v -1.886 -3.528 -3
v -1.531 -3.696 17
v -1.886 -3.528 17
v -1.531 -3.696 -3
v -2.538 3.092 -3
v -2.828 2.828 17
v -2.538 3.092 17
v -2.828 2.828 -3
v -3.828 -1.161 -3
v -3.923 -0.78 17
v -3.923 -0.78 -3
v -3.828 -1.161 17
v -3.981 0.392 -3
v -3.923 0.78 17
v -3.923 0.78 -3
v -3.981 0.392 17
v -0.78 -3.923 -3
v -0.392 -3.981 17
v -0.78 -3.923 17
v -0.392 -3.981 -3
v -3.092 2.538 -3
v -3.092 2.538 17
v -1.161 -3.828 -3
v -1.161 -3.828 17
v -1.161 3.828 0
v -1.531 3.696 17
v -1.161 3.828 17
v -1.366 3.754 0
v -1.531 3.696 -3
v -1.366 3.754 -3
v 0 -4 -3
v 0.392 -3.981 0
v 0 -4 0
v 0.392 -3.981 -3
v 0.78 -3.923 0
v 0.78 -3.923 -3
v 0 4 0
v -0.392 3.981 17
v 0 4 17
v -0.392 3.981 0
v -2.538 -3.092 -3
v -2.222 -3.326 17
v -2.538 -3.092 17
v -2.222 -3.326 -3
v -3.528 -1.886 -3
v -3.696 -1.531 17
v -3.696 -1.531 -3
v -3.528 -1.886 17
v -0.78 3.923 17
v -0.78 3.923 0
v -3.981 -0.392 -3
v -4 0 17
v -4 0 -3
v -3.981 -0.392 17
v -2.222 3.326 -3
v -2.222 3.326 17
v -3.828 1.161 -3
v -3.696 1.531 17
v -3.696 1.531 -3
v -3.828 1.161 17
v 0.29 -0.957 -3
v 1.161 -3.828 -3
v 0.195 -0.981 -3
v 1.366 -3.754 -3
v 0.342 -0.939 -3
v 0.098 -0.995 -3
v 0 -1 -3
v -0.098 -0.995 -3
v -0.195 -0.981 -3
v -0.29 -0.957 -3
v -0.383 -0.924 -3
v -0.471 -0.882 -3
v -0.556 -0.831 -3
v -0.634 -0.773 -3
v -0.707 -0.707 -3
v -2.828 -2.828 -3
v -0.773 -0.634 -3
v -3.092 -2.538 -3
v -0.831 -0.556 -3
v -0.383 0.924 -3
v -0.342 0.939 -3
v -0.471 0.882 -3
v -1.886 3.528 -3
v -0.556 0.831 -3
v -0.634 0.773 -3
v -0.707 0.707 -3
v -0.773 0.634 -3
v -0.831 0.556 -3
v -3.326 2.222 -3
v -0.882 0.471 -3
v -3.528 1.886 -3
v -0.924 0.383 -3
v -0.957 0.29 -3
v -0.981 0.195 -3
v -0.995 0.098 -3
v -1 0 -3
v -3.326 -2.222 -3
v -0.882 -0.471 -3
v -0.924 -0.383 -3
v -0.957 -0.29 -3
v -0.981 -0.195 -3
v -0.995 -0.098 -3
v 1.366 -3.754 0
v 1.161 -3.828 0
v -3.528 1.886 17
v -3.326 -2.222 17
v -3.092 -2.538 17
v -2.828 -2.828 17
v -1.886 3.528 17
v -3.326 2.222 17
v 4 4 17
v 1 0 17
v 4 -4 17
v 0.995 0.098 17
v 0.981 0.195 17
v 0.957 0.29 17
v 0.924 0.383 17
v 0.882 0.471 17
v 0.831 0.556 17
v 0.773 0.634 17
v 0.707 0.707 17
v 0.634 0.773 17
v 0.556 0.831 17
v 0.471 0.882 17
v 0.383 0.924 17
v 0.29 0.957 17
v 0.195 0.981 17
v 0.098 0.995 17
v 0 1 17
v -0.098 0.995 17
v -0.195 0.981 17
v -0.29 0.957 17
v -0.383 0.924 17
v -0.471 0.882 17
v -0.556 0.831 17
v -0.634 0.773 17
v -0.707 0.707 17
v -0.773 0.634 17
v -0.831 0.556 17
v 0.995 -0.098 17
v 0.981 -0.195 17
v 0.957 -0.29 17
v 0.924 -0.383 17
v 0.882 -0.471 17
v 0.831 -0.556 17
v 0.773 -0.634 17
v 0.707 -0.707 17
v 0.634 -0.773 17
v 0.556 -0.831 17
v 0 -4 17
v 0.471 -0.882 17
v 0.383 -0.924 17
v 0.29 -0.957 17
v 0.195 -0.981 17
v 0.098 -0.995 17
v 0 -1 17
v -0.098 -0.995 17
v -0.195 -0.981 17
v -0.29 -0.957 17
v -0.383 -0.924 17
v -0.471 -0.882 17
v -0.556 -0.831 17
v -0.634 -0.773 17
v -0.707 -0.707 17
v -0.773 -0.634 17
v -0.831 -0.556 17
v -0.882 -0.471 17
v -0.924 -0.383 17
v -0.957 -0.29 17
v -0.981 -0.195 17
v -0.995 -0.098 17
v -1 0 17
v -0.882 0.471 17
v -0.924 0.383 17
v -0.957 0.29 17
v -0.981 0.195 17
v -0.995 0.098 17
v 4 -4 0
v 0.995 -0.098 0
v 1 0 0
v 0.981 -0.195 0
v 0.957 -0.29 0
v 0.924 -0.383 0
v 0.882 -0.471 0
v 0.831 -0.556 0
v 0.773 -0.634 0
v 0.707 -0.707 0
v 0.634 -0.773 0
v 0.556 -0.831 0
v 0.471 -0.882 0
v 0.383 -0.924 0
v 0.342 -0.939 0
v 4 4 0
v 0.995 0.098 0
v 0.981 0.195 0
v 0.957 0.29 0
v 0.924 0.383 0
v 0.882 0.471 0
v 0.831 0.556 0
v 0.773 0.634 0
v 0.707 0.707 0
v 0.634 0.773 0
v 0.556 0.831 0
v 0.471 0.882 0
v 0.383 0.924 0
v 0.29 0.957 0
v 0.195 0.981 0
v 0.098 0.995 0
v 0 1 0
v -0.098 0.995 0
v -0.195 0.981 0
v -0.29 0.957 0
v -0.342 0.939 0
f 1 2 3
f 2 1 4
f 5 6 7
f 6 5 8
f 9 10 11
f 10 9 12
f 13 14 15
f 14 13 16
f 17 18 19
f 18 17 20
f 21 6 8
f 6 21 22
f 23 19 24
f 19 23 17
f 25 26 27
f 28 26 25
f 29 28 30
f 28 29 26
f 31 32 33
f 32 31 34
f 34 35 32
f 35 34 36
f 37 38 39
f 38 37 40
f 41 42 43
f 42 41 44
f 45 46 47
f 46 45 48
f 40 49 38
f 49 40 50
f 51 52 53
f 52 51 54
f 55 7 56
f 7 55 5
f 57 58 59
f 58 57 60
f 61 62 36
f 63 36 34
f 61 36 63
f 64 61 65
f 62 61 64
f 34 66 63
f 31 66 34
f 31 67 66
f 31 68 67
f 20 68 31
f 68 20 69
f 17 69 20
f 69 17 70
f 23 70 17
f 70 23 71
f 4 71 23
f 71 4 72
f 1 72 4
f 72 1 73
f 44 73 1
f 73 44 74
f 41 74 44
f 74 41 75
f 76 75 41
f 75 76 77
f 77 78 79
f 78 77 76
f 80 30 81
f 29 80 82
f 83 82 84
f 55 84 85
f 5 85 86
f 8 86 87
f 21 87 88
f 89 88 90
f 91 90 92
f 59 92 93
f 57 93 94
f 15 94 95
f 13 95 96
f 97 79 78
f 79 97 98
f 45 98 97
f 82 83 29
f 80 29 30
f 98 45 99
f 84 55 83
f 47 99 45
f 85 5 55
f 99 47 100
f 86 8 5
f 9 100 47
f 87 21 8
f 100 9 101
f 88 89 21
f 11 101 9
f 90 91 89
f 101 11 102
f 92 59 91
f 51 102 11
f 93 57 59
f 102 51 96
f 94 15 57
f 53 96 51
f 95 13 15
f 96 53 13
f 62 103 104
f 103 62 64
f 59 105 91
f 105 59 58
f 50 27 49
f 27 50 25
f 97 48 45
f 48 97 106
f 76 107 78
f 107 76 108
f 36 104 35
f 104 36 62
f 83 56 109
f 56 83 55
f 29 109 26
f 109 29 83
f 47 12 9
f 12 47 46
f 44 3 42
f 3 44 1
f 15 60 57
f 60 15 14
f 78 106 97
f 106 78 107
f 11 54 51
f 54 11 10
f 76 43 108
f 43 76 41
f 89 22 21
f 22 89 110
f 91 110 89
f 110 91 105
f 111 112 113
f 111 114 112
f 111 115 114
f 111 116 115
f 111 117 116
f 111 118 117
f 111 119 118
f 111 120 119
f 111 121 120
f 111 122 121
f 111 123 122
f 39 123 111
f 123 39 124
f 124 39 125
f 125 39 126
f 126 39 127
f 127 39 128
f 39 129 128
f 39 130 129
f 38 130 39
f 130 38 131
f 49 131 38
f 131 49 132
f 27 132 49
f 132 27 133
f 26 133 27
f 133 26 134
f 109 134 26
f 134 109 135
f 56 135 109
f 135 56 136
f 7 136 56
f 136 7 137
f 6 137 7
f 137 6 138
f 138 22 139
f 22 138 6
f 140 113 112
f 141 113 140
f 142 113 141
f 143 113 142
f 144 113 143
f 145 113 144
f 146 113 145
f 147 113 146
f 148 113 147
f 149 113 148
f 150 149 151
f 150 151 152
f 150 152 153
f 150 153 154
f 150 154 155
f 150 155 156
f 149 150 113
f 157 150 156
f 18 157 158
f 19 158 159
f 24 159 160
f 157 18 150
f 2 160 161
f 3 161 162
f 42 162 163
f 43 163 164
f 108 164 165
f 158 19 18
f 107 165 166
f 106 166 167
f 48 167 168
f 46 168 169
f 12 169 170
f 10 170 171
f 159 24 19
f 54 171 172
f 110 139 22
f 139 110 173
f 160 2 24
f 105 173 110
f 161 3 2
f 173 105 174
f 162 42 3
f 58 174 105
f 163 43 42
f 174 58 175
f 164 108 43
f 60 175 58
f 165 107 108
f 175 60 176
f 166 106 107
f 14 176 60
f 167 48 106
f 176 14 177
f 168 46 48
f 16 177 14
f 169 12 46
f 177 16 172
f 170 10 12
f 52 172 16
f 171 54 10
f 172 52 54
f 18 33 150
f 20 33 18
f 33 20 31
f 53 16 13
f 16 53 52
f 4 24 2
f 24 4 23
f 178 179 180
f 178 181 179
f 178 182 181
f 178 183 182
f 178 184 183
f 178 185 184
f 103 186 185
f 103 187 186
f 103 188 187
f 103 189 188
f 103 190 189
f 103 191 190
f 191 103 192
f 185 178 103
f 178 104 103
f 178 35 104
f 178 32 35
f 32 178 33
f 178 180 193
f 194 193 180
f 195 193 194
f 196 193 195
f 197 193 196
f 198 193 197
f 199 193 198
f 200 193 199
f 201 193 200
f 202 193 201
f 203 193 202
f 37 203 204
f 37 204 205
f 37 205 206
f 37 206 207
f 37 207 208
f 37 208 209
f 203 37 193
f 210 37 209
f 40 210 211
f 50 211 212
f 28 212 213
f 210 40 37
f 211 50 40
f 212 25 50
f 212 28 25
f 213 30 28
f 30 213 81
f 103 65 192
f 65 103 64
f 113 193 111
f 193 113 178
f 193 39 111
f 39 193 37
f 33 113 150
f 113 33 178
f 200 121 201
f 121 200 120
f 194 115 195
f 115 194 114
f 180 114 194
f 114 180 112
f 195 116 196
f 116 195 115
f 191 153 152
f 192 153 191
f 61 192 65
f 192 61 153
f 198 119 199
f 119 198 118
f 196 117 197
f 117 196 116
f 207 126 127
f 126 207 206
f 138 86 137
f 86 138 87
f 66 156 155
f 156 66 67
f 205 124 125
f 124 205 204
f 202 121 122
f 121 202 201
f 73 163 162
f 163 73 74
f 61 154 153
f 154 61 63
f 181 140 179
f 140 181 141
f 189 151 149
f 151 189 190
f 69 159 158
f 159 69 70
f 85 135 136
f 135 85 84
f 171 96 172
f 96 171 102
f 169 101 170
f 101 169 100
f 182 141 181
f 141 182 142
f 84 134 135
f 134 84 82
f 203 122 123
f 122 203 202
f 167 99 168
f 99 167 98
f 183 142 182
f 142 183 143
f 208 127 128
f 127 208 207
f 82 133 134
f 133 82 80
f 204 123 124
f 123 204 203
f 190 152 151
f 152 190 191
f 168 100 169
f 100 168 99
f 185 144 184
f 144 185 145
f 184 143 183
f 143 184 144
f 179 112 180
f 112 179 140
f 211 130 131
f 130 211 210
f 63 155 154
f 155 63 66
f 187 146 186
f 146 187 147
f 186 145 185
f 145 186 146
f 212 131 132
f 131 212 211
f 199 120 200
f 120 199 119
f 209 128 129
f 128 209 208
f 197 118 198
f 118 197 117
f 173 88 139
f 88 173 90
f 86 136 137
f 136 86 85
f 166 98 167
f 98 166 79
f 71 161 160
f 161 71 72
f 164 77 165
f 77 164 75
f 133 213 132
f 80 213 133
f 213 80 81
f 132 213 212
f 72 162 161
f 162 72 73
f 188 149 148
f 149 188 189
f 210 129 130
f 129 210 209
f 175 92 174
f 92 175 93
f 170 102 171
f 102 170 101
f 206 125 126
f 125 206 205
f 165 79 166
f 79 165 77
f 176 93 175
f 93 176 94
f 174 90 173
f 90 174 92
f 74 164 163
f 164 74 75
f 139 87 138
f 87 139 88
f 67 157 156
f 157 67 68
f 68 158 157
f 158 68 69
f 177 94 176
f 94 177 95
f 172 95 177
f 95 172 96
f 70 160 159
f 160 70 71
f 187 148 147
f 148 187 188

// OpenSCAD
$fn = 64;

or = 4;
ir = 1;
a = 20;
h1 = 17;
h2 = 3;

connecter(or, ir, a, h1, h2);

// the connector that connects between the laptop part & monitor part
// or: outer radius of the connector
// ir: inner radius of the connector
// a: the angle of the connector
// h1: the up-side of the connector
// h2: the lower-side (connecting side) of the connector
module connecter(or, ir, a, h1, h2) {
    difference() {
        union() {
            translate([or/2, 0, h1/2])
            cube([or, or*2, h1], center=true);

            difference() {
                translate([0, 0, h1/2-h2/2])
                cylinder(h=h1+h2, r=or, center=true);

                rotate([0, 0, a])
                translate([or/2, 0, -h2/2-1])
                cube([or, or*2, h2+2], center=true);
            }
        }
        
        cylinder(h=(h1+h2)*2, r=ir, center=true);
    }
}
